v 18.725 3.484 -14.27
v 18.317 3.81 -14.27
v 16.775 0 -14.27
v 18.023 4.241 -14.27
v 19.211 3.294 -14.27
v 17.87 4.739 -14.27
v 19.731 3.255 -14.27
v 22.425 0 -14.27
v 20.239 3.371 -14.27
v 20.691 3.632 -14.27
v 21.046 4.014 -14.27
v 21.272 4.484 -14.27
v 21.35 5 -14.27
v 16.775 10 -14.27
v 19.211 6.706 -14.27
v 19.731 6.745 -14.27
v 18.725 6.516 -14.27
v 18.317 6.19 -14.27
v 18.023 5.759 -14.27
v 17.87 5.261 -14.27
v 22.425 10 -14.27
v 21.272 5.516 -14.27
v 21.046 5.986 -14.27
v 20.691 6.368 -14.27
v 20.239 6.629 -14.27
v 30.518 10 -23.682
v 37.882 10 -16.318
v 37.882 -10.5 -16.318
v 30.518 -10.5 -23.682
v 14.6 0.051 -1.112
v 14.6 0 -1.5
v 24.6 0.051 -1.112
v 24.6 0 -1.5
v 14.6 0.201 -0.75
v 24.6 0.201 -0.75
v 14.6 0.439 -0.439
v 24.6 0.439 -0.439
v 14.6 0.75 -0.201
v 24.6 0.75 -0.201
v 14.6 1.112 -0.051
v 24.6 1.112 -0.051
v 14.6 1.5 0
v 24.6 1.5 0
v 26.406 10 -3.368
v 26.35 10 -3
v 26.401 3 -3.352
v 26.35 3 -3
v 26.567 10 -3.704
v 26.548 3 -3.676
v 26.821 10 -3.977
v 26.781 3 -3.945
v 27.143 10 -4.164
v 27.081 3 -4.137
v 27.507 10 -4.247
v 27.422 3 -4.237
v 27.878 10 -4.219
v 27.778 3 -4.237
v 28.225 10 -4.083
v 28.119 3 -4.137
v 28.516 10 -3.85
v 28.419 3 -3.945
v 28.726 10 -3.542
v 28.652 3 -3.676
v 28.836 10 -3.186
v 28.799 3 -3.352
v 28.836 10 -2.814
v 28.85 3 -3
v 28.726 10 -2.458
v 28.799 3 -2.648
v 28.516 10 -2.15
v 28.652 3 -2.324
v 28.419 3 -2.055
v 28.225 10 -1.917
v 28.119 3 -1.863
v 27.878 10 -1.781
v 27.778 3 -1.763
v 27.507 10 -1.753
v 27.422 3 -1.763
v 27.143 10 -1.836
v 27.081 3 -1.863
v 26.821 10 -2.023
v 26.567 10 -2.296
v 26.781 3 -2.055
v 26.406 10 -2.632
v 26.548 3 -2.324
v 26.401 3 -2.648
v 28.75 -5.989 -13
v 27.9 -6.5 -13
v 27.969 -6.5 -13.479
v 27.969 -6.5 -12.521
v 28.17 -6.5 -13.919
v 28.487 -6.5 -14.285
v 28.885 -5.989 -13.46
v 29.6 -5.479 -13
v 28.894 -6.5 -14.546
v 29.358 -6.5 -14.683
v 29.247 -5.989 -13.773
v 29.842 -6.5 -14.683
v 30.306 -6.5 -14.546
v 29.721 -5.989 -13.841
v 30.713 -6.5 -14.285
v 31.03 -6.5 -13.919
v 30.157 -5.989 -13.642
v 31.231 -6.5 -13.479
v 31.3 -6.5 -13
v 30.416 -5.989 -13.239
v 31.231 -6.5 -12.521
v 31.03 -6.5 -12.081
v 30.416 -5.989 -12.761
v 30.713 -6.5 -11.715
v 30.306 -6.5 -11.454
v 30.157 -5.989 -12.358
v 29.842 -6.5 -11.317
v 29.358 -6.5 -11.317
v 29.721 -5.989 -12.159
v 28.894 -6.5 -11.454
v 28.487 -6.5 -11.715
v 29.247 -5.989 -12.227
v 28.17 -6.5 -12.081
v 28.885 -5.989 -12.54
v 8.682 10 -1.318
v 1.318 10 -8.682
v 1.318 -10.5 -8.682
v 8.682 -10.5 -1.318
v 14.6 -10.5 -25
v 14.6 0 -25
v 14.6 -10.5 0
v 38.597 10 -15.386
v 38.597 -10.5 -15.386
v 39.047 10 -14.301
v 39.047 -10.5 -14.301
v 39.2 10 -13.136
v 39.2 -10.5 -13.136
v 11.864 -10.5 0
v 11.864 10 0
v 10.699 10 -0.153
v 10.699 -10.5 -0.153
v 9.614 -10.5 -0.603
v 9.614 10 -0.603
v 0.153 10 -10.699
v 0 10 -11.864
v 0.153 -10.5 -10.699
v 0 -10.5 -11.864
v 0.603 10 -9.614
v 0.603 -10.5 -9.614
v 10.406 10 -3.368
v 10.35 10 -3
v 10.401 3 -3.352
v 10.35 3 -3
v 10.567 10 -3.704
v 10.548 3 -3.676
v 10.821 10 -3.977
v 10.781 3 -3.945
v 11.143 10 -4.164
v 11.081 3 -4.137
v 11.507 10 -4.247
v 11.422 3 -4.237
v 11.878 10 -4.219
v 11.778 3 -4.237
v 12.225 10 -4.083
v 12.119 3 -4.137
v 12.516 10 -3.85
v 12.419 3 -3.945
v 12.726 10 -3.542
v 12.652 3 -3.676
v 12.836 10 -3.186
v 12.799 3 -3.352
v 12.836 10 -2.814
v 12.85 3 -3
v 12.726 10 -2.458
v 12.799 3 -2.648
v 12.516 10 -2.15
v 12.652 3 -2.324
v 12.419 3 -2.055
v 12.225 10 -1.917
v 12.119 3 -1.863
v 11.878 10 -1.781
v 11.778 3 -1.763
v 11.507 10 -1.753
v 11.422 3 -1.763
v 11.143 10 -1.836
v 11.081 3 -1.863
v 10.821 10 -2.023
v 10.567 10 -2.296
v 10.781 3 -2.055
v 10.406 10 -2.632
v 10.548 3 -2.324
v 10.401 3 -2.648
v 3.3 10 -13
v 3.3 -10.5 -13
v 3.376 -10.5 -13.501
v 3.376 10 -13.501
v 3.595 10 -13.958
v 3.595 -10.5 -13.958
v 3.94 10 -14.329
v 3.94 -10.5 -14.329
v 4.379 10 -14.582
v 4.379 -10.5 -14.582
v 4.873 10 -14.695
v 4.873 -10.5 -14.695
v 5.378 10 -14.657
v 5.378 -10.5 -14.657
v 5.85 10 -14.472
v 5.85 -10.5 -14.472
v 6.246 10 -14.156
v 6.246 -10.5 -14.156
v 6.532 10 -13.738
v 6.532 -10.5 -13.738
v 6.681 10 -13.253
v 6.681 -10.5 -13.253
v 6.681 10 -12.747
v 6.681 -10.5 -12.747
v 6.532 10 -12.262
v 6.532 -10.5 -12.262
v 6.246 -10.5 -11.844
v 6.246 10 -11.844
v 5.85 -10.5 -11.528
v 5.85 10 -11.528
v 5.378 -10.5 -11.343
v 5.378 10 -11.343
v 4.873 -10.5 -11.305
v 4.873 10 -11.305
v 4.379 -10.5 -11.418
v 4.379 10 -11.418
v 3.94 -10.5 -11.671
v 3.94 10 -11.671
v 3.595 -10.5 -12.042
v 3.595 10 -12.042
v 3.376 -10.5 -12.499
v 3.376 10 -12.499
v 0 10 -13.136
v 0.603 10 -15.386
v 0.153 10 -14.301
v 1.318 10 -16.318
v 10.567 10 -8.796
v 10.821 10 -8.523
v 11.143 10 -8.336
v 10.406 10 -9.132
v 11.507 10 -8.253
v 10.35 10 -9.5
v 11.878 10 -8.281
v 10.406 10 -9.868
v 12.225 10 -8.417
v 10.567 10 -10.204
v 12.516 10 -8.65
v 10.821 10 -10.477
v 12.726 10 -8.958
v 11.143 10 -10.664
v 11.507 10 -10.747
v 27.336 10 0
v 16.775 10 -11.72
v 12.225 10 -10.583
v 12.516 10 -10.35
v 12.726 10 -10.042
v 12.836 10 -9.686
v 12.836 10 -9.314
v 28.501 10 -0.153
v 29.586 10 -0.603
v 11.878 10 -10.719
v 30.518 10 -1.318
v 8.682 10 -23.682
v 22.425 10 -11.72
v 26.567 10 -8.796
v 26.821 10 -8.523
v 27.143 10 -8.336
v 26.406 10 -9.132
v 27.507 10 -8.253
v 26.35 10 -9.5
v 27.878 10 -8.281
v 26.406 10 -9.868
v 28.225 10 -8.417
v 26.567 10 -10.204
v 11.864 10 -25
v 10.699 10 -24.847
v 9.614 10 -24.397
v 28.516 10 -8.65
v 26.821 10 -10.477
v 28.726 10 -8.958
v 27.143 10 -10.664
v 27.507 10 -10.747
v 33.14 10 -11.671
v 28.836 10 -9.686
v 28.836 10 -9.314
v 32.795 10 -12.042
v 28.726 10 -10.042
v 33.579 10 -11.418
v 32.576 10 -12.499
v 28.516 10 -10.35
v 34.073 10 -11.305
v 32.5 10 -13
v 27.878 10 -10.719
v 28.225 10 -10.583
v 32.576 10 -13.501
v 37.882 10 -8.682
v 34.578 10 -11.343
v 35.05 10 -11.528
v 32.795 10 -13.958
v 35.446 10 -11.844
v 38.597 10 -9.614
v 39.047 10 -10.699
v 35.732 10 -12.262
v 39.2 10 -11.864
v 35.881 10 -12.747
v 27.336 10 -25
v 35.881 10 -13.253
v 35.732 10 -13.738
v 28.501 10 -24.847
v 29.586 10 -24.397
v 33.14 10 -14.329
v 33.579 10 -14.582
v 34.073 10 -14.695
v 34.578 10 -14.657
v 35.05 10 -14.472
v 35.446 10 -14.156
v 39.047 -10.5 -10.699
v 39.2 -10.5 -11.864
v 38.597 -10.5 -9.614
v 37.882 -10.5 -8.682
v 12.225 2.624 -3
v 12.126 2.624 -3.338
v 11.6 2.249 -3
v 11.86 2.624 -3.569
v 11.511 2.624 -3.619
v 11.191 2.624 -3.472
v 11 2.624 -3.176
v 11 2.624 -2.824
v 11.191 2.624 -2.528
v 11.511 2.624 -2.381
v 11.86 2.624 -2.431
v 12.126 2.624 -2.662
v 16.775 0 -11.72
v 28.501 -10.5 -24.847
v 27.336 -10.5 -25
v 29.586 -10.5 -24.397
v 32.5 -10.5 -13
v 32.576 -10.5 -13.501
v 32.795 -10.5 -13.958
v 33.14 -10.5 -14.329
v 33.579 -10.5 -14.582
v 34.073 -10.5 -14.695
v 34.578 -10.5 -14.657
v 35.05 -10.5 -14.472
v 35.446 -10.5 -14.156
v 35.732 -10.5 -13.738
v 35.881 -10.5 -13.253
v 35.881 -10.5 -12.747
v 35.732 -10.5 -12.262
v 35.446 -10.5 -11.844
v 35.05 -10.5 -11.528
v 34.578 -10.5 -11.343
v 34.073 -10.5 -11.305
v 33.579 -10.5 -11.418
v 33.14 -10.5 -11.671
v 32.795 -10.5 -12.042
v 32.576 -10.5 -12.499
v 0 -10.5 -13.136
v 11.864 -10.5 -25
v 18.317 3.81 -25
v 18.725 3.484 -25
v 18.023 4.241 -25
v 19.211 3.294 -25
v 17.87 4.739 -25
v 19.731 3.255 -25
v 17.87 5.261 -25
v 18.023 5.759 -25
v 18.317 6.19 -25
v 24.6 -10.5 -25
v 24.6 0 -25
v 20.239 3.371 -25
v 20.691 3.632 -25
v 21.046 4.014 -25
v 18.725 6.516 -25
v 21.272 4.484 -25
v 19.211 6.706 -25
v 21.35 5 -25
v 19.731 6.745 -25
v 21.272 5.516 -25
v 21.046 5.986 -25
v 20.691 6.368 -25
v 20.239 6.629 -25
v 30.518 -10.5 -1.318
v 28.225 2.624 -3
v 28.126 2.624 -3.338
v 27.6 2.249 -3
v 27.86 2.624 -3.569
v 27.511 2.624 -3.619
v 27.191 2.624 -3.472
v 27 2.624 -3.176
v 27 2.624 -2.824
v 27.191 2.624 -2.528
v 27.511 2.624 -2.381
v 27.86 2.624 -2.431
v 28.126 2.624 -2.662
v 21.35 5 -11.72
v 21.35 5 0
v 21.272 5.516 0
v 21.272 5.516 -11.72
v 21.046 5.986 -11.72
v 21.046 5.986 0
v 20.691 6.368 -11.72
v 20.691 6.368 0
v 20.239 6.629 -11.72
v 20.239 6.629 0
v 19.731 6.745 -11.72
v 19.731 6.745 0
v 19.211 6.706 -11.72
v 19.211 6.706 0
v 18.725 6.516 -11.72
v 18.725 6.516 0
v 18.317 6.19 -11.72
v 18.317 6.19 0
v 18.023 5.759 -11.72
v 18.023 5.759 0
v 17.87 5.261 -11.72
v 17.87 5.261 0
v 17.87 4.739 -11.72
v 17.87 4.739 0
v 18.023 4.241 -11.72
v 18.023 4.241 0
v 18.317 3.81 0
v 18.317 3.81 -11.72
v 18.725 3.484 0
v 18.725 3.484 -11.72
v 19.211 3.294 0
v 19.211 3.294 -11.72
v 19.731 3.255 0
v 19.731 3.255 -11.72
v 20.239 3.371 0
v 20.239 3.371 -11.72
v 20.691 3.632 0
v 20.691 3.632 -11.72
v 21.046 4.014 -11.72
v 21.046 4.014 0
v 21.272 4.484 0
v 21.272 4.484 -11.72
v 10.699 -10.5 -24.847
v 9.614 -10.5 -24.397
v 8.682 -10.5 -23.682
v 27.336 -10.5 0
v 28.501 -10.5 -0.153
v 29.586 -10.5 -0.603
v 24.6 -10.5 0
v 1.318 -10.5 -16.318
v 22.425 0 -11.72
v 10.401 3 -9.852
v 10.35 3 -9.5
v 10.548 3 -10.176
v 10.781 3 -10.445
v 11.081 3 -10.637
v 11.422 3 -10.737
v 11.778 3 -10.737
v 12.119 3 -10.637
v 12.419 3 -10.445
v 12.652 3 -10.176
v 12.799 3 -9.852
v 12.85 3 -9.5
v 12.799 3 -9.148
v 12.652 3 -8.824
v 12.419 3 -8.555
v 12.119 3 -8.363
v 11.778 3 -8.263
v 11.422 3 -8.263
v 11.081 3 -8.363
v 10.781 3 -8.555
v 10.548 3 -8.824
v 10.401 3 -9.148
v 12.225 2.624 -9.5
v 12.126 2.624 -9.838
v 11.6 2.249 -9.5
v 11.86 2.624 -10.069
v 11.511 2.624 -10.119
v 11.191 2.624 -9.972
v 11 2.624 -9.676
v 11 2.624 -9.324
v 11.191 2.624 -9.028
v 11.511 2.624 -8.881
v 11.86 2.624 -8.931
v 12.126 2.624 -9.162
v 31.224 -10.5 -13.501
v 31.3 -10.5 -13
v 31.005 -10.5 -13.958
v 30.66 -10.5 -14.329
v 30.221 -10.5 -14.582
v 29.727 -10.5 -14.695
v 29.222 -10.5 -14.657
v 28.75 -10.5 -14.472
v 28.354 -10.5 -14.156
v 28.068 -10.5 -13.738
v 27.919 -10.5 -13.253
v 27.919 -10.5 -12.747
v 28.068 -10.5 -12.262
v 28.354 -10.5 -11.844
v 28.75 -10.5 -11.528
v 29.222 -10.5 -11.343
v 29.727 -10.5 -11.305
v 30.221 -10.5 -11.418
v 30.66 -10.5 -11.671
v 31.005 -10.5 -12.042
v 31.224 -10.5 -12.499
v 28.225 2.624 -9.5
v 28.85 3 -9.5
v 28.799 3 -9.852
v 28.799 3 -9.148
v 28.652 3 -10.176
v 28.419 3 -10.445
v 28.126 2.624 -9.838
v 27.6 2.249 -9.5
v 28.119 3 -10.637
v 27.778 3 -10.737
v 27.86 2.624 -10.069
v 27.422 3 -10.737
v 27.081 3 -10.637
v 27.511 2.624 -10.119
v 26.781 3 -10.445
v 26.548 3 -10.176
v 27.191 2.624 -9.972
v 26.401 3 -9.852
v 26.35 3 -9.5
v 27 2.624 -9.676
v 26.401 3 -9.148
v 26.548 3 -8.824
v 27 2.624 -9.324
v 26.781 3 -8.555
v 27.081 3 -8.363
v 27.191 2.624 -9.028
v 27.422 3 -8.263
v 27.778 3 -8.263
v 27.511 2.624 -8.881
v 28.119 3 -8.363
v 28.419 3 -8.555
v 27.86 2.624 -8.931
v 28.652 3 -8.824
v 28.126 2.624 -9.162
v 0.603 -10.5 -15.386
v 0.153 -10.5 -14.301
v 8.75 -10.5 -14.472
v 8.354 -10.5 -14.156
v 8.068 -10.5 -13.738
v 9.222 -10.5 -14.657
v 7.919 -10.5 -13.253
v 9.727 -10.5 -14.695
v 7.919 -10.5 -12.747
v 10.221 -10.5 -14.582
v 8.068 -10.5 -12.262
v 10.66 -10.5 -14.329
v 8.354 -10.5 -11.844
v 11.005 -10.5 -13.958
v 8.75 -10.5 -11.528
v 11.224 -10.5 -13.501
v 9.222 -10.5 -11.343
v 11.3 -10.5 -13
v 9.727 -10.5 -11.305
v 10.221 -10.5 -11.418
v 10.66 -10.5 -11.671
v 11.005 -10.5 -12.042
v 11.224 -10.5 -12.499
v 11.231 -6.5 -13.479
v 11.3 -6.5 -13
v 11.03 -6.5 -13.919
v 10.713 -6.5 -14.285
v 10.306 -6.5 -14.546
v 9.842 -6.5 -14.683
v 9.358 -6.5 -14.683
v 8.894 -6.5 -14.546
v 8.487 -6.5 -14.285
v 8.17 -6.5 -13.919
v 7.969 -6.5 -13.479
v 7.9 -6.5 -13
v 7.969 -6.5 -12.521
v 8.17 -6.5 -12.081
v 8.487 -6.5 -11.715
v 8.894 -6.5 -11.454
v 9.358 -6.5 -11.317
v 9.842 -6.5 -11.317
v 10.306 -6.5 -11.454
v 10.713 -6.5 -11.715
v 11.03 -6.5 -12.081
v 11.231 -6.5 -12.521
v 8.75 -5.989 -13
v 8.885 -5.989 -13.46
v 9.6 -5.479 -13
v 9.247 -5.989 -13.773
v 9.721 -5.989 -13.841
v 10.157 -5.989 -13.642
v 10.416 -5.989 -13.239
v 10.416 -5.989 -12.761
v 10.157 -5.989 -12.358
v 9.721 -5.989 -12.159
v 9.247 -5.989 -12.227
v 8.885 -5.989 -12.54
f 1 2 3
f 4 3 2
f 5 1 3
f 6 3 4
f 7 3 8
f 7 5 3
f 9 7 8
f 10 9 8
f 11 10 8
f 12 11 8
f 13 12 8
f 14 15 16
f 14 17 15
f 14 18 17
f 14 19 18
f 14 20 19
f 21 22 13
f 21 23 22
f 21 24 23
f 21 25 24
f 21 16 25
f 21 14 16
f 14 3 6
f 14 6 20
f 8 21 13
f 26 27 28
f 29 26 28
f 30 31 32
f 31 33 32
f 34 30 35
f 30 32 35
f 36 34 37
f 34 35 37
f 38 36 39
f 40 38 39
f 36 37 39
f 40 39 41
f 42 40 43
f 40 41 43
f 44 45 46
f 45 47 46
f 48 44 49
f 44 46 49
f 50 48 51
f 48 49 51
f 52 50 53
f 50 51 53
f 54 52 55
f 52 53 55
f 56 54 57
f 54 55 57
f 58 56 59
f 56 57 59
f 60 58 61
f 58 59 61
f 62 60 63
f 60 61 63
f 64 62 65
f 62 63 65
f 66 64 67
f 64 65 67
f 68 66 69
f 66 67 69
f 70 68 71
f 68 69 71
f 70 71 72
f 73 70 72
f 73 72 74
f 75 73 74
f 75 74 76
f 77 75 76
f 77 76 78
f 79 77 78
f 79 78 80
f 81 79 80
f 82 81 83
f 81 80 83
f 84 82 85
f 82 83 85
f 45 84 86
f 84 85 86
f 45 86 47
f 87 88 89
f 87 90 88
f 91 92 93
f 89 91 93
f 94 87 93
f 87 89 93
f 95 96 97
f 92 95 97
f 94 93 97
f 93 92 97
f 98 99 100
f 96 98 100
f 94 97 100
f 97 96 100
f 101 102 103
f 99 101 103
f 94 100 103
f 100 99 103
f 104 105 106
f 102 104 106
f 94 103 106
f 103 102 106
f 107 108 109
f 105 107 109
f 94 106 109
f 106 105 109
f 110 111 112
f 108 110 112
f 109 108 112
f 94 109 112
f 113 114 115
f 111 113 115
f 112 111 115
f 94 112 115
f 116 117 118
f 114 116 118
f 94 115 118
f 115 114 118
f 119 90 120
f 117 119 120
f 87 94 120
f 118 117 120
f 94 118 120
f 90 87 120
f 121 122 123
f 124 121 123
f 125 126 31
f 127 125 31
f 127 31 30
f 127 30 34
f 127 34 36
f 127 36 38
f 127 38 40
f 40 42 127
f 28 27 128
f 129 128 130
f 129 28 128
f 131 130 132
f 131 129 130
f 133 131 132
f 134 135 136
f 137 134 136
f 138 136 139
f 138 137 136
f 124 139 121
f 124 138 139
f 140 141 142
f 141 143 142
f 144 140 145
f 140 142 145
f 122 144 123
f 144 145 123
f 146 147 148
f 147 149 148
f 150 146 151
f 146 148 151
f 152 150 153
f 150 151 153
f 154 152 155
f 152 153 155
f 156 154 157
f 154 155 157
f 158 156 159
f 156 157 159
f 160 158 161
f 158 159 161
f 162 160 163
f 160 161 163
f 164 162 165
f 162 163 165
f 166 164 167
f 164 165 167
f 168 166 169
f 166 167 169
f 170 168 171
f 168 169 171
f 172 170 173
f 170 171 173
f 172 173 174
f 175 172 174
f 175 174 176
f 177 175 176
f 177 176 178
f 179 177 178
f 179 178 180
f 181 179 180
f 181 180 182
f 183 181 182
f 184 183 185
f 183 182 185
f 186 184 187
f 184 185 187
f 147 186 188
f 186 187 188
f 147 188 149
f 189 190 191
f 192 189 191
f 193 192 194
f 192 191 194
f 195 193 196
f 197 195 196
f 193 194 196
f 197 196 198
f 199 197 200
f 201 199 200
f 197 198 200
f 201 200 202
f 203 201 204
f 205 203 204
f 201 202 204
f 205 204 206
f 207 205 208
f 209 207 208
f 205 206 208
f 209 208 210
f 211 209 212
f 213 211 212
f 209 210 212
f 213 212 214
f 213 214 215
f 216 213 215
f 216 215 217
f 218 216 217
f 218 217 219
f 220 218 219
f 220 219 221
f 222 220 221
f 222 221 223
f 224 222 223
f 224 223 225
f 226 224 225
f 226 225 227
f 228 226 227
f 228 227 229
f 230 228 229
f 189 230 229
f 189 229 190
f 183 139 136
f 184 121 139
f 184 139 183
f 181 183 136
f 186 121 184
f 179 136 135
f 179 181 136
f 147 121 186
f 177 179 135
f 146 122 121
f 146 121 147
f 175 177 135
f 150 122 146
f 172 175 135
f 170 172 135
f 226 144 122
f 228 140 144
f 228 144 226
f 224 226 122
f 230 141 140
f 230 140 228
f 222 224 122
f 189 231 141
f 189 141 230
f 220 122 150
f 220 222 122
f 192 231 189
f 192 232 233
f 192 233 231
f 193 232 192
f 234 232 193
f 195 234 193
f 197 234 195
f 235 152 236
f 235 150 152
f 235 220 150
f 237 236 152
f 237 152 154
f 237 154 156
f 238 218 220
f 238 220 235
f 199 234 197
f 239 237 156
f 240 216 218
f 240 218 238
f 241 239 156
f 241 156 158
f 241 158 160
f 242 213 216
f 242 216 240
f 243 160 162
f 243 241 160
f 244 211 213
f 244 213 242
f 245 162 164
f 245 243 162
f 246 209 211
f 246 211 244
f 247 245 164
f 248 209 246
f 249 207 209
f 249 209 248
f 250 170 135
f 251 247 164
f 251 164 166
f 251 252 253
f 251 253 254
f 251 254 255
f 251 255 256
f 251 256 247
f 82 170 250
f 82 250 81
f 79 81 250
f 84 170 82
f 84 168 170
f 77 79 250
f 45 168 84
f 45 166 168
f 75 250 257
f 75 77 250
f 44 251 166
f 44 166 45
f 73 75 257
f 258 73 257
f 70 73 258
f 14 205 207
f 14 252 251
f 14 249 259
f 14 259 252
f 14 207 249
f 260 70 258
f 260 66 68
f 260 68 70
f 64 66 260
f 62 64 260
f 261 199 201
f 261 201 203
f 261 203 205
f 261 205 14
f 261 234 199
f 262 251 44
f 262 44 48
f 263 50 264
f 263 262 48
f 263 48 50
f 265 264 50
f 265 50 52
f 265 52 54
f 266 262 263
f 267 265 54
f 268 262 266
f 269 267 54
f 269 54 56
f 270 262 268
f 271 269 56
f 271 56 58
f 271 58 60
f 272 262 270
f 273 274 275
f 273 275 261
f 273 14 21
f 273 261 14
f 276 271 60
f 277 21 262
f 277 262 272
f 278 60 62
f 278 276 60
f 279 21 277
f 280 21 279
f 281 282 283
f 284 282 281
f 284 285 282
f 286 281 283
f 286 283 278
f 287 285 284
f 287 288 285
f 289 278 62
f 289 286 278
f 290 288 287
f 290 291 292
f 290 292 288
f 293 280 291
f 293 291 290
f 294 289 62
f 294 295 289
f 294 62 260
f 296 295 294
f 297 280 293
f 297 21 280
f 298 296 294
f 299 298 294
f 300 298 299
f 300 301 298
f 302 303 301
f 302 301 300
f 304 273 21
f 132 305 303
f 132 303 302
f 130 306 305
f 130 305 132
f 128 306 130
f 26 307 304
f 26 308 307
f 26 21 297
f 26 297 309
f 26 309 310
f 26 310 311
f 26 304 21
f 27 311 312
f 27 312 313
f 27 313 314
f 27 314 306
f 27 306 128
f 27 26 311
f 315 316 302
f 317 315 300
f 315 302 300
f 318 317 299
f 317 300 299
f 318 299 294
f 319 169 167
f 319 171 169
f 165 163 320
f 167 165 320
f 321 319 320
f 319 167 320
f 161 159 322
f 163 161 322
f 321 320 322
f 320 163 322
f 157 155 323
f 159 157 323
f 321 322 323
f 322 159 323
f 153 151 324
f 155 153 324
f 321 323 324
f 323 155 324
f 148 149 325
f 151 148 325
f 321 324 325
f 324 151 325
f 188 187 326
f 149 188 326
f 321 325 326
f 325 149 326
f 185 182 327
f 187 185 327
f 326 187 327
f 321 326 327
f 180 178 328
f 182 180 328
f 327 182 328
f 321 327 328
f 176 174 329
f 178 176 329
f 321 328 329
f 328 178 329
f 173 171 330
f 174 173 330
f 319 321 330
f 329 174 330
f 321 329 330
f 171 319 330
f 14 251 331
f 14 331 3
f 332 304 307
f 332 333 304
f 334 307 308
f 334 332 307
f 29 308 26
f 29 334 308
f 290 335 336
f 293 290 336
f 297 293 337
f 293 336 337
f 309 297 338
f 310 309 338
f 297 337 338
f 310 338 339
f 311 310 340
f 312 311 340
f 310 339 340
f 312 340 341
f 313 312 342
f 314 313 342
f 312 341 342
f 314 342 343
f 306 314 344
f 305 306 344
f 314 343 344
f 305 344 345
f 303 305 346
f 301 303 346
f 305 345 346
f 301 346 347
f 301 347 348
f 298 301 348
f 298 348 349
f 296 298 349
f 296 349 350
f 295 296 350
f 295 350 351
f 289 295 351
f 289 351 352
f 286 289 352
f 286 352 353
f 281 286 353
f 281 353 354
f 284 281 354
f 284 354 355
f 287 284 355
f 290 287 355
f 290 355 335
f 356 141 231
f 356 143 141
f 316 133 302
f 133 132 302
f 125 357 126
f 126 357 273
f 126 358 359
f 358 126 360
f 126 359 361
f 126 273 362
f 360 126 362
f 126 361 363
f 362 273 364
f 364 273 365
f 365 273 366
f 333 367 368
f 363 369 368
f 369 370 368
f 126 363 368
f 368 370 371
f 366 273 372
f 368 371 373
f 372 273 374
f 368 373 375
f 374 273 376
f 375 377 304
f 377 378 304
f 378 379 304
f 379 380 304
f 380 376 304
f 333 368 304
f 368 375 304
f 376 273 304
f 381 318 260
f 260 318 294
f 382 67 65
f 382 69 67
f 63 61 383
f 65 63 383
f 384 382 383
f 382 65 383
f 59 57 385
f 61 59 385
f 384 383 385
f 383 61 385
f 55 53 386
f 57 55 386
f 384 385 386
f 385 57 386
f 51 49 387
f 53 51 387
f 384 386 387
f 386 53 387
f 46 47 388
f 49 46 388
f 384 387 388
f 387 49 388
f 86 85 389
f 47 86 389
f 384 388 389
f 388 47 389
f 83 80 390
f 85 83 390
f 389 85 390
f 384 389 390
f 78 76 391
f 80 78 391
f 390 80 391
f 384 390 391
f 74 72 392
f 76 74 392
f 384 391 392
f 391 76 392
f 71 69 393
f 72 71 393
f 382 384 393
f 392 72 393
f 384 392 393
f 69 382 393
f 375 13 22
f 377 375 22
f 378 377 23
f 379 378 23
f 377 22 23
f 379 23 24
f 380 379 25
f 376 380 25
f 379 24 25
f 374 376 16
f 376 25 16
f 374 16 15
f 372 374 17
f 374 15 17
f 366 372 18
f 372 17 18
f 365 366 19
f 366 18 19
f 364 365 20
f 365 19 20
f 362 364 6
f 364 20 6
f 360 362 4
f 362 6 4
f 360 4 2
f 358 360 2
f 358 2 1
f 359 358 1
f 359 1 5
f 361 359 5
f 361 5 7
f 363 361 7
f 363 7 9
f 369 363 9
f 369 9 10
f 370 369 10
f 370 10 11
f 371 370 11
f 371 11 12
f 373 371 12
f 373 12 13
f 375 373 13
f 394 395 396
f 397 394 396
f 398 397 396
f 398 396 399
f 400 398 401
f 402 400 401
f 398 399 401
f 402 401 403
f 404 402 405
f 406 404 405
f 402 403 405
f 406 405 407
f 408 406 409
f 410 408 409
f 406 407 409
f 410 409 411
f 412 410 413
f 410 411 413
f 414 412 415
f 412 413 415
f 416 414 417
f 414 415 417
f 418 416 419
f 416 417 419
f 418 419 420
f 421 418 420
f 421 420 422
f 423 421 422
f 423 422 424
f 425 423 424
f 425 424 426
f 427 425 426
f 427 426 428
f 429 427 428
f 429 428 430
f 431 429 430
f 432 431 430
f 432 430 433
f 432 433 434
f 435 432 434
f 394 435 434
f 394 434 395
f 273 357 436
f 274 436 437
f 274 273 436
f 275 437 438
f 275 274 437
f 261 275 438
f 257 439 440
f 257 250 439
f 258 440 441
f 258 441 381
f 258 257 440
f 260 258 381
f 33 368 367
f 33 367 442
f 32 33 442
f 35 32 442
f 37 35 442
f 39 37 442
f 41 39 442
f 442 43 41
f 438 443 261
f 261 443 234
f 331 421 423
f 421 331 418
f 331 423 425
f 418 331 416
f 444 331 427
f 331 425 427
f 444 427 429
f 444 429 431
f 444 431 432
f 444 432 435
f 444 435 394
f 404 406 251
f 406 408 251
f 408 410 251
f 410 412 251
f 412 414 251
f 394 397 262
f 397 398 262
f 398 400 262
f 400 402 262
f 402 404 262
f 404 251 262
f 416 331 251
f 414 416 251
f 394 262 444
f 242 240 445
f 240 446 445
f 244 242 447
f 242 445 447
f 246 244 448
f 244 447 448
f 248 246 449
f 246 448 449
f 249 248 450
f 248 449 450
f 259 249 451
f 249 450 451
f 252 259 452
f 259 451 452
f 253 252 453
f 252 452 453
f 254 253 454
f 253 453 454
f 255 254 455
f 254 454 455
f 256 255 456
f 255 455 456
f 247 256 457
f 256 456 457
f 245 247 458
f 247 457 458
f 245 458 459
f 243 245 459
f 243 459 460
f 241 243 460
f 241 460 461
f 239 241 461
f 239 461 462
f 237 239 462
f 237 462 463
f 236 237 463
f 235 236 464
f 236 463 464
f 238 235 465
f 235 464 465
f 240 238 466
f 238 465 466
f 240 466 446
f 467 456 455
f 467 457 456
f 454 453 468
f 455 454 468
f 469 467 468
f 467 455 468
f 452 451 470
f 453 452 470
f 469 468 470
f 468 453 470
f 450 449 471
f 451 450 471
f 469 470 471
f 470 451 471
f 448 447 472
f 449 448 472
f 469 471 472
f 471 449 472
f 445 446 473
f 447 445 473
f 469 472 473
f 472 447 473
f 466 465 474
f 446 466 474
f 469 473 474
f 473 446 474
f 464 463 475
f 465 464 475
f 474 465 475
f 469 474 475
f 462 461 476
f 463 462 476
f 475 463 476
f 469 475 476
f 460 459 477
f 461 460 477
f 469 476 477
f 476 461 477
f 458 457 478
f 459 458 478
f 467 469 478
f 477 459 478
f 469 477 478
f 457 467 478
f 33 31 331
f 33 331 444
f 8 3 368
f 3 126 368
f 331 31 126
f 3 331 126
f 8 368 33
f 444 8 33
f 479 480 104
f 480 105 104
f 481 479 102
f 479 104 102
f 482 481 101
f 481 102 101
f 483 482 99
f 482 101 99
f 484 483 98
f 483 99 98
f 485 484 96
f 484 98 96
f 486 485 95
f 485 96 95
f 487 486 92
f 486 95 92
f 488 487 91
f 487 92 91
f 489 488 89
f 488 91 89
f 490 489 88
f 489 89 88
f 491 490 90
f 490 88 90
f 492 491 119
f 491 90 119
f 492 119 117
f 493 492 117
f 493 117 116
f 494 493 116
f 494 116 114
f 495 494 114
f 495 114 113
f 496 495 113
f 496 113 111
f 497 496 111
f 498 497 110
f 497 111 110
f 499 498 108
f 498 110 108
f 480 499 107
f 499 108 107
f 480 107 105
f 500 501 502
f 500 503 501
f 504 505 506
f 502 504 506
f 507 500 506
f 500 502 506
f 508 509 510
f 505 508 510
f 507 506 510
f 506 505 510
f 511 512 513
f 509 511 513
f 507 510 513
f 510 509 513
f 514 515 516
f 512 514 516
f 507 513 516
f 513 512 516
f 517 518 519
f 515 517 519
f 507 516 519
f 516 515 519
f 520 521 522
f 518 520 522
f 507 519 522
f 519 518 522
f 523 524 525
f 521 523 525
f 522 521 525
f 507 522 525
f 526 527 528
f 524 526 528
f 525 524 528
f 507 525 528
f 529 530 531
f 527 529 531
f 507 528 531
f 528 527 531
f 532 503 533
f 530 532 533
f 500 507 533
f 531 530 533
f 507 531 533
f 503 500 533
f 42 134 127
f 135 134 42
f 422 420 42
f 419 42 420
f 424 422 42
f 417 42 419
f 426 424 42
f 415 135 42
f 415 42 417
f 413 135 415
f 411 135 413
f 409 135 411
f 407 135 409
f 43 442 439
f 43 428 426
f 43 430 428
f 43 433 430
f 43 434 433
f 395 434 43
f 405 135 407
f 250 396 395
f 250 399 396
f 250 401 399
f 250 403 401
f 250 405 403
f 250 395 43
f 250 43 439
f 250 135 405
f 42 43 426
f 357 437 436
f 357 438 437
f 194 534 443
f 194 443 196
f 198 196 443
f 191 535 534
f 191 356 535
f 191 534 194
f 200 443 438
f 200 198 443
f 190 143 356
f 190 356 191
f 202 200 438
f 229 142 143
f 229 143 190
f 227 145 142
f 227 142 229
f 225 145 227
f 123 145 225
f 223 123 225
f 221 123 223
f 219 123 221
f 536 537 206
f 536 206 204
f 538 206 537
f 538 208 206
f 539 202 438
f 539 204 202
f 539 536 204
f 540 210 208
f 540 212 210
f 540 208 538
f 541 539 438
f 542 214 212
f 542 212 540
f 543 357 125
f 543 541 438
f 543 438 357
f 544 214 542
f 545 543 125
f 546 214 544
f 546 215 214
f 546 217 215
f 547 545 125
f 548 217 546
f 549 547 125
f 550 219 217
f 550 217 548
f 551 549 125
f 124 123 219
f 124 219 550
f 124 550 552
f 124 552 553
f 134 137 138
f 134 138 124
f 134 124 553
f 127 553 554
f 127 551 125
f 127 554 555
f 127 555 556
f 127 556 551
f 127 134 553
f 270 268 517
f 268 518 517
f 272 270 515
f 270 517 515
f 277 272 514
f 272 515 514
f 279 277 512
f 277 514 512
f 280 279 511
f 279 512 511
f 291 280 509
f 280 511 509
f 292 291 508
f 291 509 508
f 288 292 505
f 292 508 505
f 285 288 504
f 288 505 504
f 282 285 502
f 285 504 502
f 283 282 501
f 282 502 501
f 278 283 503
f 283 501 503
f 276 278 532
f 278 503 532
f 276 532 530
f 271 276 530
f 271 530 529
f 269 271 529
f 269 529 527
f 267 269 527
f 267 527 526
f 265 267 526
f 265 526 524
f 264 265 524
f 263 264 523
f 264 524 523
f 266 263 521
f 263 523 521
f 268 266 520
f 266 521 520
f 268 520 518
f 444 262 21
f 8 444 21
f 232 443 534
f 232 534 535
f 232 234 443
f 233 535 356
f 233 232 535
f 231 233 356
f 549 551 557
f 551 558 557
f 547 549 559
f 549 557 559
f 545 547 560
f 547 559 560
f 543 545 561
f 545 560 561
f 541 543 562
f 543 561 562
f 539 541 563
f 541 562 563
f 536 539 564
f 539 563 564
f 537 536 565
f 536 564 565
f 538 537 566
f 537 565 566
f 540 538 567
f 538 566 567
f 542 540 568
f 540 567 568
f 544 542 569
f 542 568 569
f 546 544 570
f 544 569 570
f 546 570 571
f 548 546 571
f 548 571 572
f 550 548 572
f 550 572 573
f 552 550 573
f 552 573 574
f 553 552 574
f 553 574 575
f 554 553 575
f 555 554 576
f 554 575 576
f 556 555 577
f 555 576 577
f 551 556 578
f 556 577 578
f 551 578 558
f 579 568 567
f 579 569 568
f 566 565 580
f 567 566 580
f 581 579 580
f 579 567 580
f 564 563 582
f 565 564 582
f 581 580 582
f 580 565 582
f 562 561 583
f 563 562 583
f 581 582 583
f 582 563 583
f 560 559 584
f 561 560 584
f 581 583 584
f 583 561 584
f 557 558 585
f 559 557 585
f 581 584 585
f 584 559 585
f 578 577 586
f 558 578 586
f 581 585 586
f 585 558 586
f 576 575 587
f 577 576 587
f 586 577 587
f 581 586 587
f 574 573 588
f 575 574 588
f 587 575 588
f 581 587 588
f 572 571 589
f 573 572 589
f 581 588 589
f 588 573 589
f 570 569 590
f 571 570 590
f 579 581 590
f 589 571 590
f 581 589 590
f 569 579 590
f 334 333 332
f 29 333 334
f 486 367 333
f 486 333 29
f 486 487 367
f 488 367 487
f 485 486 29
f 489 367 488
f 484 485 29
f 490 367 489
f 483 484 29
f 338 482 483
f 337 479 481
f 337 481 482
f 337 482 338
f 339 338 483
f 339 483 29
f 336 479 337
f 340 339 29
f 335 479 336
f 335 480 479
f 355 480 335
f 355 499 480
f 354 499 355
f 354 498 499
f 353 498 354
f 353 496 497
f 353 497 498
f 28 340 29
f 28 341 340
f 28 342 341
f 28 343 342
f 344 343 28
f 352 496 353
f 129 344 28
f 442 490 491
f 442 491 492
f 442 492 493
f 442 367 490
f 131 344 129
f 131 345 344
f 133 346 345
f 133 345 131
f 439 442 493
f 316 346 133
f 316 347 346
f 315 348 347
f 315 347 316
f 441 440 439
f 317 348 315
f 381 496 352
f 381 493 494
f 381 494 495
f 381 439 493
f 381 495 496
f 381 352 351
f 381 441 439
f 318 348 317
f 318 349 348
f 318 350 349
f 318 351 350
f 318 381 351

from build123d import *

# Parameters (mm, degrees)
SKETCH1_W                      = 39.2
SKETCH1_H                      = 25
BOSS_EXTRUDE1_DEPTH            = 10
F_3_5_3_5_DIAMETER_HOLE1_D     = 3.5
SKETCH9_W                      = 14.6
SKETCH9_H                      = 25
BOSS_EXTRUDE2_DEPTH            = 10.5
SKETCH10_W                     = 5.65
SKETCH10_H                     = 2.55
CUT_EXTRUDE4_DEPTH             = 10
F_2_5_2_5_DIAMETER_HOLE1_D     = 2.5
F_2_5_2_5_DIAMETER_HOLE1_DEPTH = 7
F_2_5_2_5_DIAMETER_HOLE1_TIP   = 0.751075774
F_3_4_3_4_DIAMETER_HOLE1_D     = 3.4
CHAMFER1_SIZE                  = 10
FILLET5_R                      = 4.5
FILLET6_R                      = 1.5
F_3_4_3_4_DIAMETER_HOLE2_D     = 3.4
F_3_4_3_4_DIAMETER_HOLE2_DEPTH = 4
F_3_4_3_4_DIAMETER_HOLE2_TIP   = 1.021463052


with BuildPart() as part:
    # Sketch1 → Boss-Extrude1 (new body)
    with BuildSketch(Plane(origin=(0, 0, 0), x_dir=(1, 0, 0), z_dir=(0, 1, 0))):
        with Locations((19.6, 12.5)):
            Rectangle(SKETCH1_W, SKETCH1_H)
    extrude(amount=BOSS_EXTRUDE1_DEPTH)

    # Ø3.5 (3.5) Diameter Hole1 (through all)
    with Locations(Plane(origin=(0, 0, -25), x_dir=(-1, 0, 0), z_dir=(0, 0, -1))):
        with Locations((-19.6, 5)):
            Hole(F_3_5_3_5_DIAMETER_HOLE1_D / 2)

    # Sketch9 → Boss-Extrude2 (add)
    with BuildSketch(Plane.XZ):
        with Locations((31.9, -12.5)):
            Rectangle(SKETCH9_W, SKETCH9_H)
        with Locations((7.3, -12.5)):
            Rectangle(SKETCH9_W, SKETCH9_H)
    extrude(amount=BOSS_EXTRUDE2_DEPTH)

    # Sketch10 → Cut-Extrude4 (cut)
    with BuildSketch(Plane(origin=(0, 10, 0), x_dir=(1, 0, 0), z_dir=(0, 1, 0))):
        with Locations((19.6, 12.995)):
            Rectangle(SKETCH10_W, SKETCH10_H)
    extrude(amount=-CUT_EXTRUDE4_DEPTH, mode=Mode.SUBTRACT)

    # Ø2.5 (2.5) Diameter Hole1
    with Locations(Plane(origin=(0, 10, 0), x_dir=(1, 0, 0), z_dir=(0, 1, 0))):
        with Locations((11.6, 3), (27.6, 3), (27.6, 9.5), (11.6, 9.5)):
            Hole(F_2_5_2_5_DIAMETER_HOLE1_D / 2, depth=F_2_5_2_5_DIAMETER_HOLE1_DEPTH)
            with Locations((0, 0, -(F_2_5_2_5_DIAMETER_HOLE1_DEPTH + F_2_5_2_5_DIAMETER_HOLE1_TIP / 2))):  # 118° drill point
                Cone(0, F_2_5_2_5_DIAMETER_HOLE1_D / 2, F_2_5_2_5_DIAMETER_HOLE1_TIP, mode=Mode.SUBTRACT)

    # Ø3.4 (3.4) Diameter Hole1 (through all)
    with Locations(Plane(origin=(0, 10, 0), x_dir=(1, 0, 0), z_dir=(0, 1, 0))):
        with Locations((34.2, 13), (5, 13)):
            Hole(F_3_4_3_4_DIAMETER_HOLE1_D / 2)

    # Chamfer1
    chamfer1_edges = [part.edges().sort_by_distance(p)[0] for p in [
        (0, -0.25, 0),
        (0, -0.25, -25),
        (39.2, -0.25, -25),
        (39.2, -0.25, 0),
    ]]
    chamfer(chamfer1_edges, length=CHAMFER1_SIZE)

    # Fillet5
    fillet5_edges = [part.edges().sort_by_distance(p)[0] for p in [
        (39.2, -0.25, -10),
        (0, -0.25, -10),
        (0, -0.25, -15),
        (29.2, -0.25, -25),
        (10, -0.25, -25),
        (29.2, -0.25, 0),
        (10, -0.25, 0),
        (39.2, -0.25, -15),
    ]]
    fillet(fillet5_edges, radius=FILLET5_R)

    # Fillet6
    fillet6_edges = [part.edges().sort_by_distance(p)[0] for p in [
        (19.6, 0, 0),
    ]]
    fillet(fillet6_edges, radius=FILLET6_R)

    # Ø3.4 (3.4) Diameter Hole2
    with Locations(Plane(origin=(0, -10.5, 0), x_dir=(-1, 0, 0), z_dir=(0, -1, 0))):
        with Locations((-9.6, 13), (-29.6, 13)):
            Hole(F_3_4_3_4_DIAMETER_HOLE2_D / 2, depth=F_3_4_3_4_DIAMETER_HOLE2_DEPTH)
            with Locations((0, 0, -(F_3_4_3_4_DIAMETER_HOLE2_DEPTH + F_3_4_3_4_DIAMETER_HOLE2_TIP / 2))):  # 118° drill point
                Cone(0, F_3_4_3_4_DIAMETER_HOLE2_D / 2, F_3_4_3_4_DIAMETER_HOLE2_TIP, mode=Mode.SUBTRACT)


solid = part.part
